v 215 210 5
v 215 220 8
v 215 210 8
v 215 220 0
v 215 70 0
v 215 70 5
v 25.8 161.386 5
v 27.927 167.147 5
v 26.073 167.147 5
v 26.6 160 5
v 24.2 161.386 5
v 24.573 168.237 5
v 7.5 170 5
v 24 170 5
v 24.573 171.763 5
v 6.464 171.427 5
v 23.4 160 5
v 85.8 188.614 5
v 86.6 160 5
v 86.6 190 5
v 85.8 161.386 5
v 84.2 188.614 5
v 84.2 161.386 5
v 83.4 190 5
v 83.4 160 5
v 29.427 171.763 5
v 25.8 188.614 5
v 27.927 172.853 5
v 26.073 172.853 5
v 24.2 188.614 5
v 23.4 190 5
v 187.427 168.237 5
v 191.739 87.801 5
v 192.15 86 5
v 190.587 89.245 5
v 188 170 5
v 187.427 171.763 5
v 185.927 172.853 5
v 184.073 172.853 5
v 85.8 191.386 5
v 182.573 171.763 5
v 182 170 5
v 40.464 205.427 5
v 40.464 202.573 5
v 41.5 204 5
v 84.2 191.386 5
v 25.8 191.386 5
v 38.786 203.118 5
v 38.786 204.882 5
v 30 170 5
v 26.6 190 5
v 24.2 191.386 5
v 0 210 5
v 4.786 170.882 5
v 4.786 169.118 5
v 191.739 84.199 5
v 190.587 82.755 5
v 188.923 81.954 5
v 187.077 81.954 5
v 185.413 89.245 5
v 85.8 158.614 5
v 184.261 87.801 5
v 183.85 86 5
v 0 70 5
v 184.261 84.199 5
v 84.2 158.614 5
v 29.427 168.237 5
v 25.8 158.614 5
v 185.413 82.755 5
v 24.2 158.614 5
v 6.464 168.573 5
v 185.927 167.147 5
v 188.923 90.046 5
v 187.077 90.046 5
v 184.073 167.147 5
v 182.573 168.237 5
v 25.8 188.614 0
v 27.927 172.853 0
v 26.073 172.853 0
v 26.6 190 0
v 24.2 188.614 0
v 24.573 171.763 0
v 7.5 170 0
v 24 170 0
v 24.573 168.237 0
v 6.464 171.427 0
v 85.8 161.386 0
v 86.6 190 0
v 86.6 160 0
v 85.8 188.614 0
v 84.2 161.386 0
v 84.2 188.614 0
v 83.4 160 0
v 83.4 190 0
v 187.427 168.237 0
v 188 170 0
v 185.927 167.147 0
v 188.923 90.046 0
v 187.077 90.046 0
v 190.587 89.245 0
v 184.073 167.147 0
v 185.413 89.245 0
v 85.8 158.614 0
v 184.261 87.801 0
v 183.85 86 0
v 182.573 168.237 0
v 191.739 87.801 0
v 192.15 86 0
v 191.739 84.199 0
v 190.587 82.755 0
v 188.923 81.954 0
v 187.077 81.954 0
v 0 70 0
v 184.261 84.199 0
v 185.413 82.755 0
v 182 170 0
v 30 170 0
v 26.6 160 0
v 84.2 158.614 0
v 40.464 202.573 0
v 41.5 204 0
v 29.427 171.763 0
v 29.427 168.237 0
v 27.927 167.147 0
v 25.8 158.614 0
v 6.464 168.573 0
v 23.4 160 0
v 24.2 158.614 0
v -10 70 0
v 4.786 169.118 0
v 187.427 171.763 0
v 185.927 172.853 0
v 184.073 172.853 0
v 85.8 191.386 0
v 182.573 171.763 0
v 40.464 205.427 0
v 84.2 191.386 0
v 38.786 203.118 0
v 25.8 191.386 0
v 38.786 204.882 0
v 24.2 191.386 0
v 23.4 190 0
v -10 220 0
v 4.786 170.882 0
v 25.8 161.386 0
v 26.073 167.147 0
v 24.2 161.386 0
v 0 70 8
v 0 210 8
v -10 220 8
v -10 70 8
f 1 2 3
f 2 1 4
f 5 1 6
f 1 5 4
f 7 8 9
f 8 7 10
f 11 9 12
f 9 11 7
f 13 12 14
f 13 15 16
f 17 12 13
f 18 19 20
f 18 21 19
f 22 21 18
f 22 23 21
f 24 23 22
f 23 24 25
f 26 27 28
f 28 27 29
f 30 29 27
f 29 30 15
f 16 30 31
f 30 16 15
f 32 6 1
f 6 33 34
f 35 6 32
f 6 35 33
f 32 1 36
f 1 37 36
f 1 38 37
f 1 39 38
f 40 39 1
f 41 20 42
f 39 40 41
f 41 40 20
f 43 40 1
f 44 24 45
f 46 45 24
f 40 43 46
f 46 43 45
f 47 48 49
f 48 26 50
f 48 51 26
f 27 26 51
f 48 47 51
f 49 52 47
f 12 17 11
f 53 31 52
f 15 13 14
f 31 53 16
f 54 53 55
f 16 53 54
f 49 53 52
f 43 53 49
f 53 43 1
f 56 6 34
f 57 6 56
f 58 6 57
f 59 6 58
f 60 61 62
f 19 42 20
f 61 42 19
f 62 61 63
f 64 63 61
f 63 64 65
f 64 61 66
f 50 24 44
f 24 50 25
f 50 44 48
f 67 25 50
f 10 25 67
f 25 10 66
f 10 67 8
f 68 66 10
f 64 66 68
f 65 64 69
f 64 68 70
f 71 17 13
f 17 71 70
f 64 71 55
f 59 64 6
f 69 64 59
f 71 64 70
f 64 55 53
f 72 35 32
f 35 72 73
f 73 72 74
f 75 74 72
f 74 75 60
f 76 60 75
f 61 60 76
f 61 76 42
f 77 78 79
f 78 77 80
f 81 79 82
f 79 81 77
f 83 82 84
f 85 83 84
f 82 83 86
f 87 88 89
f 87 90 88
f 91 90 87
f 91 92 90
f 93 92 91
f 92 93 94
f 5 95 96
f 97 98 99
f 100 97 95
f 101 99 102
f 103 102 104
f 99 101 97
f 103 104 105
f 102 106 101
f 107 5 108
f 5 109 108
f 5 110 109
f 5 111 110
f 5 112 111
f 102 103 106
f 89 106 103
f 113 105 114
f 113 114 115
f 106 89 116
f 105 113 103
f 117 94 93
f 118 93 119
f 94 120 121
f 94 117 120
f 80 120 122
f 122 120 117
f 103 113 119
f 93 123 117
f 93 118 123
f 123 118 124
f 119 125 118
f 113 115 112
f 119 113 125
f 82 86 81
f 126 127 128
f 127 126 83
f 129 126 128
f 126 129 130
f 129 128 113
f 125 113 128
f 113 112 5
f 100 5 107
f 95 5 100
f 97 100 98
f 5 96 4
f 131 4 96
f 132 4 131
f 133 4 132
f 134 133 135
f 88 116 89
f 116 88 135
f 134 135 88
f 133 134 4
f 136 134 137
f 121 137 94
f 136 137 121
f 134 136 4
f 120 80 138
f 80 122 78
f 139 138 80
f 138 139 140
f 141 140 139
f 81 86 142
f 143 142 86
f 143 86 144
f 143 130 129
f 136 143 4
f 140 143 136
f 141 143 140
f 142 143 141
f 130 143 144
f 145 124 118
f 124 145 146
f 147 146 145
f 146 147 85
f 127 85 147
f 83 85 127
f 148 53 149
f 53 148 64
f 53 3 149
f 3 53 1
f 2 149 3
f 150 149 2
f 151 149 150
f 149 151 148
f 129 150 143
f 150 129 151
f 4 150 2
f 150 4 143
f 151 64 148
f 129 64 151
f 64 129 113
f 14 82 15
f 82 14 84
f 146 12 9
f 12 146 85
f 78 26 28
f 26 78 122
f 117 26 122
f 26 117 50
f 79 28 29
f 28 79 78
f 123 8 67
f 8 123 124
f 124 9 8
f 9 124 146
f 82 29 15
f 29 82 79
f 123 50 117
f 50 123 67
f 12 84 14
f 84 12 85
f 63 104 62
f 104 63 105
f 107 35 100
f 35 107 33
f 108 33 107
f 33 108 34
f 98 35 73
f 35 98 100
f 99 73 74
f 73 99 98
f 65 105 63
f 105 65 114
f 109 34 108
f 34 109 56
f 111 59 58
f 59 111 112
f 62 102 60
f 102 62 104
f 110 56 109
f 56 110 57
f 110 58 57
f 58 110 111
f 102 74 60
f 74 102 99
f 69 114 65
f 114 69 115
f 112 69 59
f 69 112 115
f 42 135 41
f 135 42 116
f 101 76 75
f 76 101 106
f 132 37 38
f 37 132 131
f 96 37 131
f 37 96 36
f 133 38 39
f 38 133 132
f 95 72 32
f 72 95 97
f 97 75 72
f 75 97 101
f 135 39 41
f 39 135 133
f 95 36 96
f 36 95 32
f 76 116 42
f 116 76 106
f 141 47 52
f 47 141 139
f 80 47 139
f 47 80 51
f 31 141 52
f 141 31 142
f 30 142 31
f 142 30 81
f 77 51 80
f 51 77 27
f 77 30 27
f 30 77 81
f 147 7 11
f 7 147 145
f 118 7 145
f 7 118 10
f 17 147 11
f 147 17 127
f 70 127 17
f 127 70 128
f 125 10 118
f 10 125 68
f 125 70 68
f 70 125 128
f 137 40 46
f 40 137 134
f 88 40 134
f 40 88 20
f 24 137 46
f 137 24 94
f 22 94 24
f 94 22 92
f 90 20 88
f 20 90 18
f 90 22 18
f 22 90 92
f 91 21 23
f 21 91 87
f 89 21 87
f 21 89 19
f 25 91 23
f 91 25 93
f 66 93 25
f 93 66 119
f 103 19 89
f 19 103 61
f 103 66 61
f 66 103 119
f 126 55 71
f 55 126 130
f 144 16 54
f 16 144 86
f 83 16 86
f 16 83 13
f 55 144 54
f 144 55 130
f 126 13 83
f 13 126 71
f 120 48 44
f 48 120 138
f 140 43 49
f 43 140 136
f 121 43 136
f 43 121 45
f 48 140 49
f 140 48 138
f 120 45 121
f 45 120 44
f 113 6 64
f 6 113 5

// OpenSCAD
//mounting frames for faces

    //Select, please: uncomment "//"

drilling_jig();
//front();
//back_top();
//back_bottom();
//axis_top(); //for detachable cover, instead x-profile plus cover_mounting()
//cover_top();
//oc_lab(); //lettering OC_Lab
//left_front_cable_channel();
//right_front();
//sides_back();  //2 needed
//bottom_front();
//bottom_back();
//cover_mounting();

x = 215;
y1 = 130; //front
y2 = 120; //back
yb = 246; //bottom
overlap = 12;
y1_o=y1-2*overlap; //y1 for cover
z = 210 - 2 * overlap; //210 mm - 2 x 12 mm
z2=z-20; //-20=y_end and y_motor
h = 17;
d = 5;
r1 = 1.5;
offset=6.5;

module drilling_jig() {
difference() {
    union() {
    cube([215, 210, 5]);
    translate([-10, 70, 0]) cube([10, 150, 8]);
    translate([0, 210, 0]) cube([215, 10, 8]);
    }
    //HDMI plug, center for 23-mm drill
    translate([27, 210-40, 0]) cylinder(h=10, r=3);
    //12-V plug
    translate([215-27, 210-124, 0]) cylinder(h=10, r=4.15); 
    //Adafruit 4218 - USB-C plug, center for 23-mm drill
    translate([185, 210-40, 0]) cylinder(h=5, r=3);
    //USB-Hub mounting with zip ties
    translate([25, 190, 0]) cylinder(h=10, r=1.6);
    translate([25, 190-30, 0]) cylinder(h=10, r=1.6);
    translate([85, 190, 0]) cylinder(h=10, r=1.6);
    translate([85, 190-30, 0]) cylinder(h=10, r=1.6);
    translate([6, 210-40, 0]) cylinder(h=15, r=r1);
    translate([40, 210-6, 0]) cylinder(h=15, r=r1);
    cube([215, 70, 5]);
    }
}
module bottom_front() {
difference() {
    union() {
    x_axis();
    translate([-5, h, 5]) rotate([180, 0, 90]) yb_axis_left();
    translate([x+5, h+yb, 5]) rotate([180, 0, 270]) yb_axis_right();
    translate([x, 2*h+yb, 0]) rotate([180, 180, 0]) x_axis();
    }
translate([-5, 135, -2]) cube([x+10, 180, 20]);
}
}
module bottom_back() {
difference() {
    union() {
    x_axis();
    translate([-5, h, 5]) rotate([180, 0, 90]) yb_axis_left();
    translate([x+5, h+yb, 5]) rotate([180, 0, 270]) yb_axis_right();
    translate([x, 2*h+yb, 0]) rotate([180, 180, 0]) x_axis();
    }
translate([-5, 0, -2]) cube([x+10, 155, 20]);
translate([89, 100, -2]) cube([37, 200, 10]);
}
}
module sides_back() {
difference() {
    union() {
    y2_axis();   
    translate([y2+d, h, 0]) rotate([0, 0, 90]) z_axis();
    translate([-5, z+h, 0]) rotate([0, 0, 270]) z_axis();
    rotate([0, 0, 180]) translate([-y2, -(z+h+17), 0]) y2_axis();
    }
translate([0, 110, 0]) cube([30, 146, 10], center=true);
}
}
module right_front() {
y1_axis();   
translate([y1+d, h, 0]) rotate([0, 0, 90]) z_axis();
translate([-5, z+h, 0]) rotate([0, 0, 270]) z_axis();
rotate([0, 0, 180]) translate([-y1, -(z+h+17), 0]) y1_axis();
}
module left_front_cable_channel() {
y1_axis();   
translate([y1+5, h, 0]) rotate([0, 0, 90]) z_axis();
translate([-5, z+h, 0]) rotate([0, 0, 270]) z_axis_cable_channel();
rotate([0, 0, 180]) translate([-y1, -(z+h+17), 0]) y1_axis_cable_channel();
}
module oc_lab() {
translate([0, 0, 0])
linear_extrude(3) text("OCLab2", size =20, direction = "ltr", spacing =1);
translate([0, -2, 0]) cube([101, 2, 3]);
translate([100.8, 19, 0])
linear_extrude(3) text("GM", size =8, direction = "ltr", spacing =1);
    translate([110, 23, 0])
    difference() {
    cylinder(r=10, h=3);
    cylinder(r=9, h=3);
    }
    translate([94, 18.4, 0]) cube([25, 1, 3]);
}
module cover_top() {
 x_magnet();
    rotate([0,0,-90]) translate([-(y1-overlap),-5,1.5])
 y1_axis_oB();
    rotate([0,0,90]) translate([overlap,-(x+5),1.5])
 y1_axis_oB();
}
//axis_top for detachable cover instead x-profile plus z_axis??
module axis_top() {
difference() {
    union() {
    cube([x-0.5, 20, 20]);
    translate([0, -12, 6]) cube([x-0.5, overlap, 6.5]);
    translate([0, 7.5, 20]) cube([x-0.5, 6.5, overlap]);
    }
    translate([15, -(overlap-3), 0])
    cylinder(h=30, r=1.5);
    translate([x-0.5-15, -(overlap-3), 0])
    cylinder(h=30, r=1.5);
    rotate([90, 0, 0])
    translate([15, 20+overlap-3, -20])
    cylinder(h=30, r=1.5);
    rotate([90, 0, 0])
    translate([x-0.5-15, 20+overlap-3, -20])
    cylinder(h=30, r=1.5);
}
}
module front() {
    difference() {
    union() {
    rotate([180,0,0]) translate([0, -12, -6.5])
    x_axis_front();
    rotate([180,0,90]) translate([overlap, -5, -5]) 
    z2_axis_front();
    rotate([180,0,270]) translate([-(z2+overlap), -(x+5), -5]) z2_axis_front();
    }
    translate([108, 8.5, 4]) cube([140, 8, 10], center=true);
}
}
module back_top() {
difference() {
union() {
rotate([180,0,90]) translate([0, -5, -5]) 
    z_axis_cable_channel_back();
rotate([180,0,270]) translate([-(z+overlap), -(x+5), -5]) z_axis_back();
translate([x,z+h+overlap,0]) rotate([0,0,180]) x_axis();
    }
    //translate([5, 183, -10])
    //cube([10, 15, 20]);
    translate([-10, 0, -10])
    cube([230, 100, 20]);
    }
}
module back_bottom() {
difference() {
union() {
rotate([180,0,90]) translate([0, -5, -5]) 
    z_axis_cable_channel_back();
rotate([180,0,270]) translate([-(z+overlap), -(x+5), -5]) z_axis_back();
translate([x,z+h+overlap,0]) rotate([0,0,180]) x_axis();
    }
    translate([-10, 100, -10])
    cube([230, 120, 20]);
    }
}
module x_axis() {
difference() {
    union() {
    cube([x, h, d]);
    translate([0,5,0])
    cube([x, overlap, offset]);
    }
}
}
module x_axis_front() {
    cube([x, overlap, offset]);
    translate([-5,0,1.5])
    cube([5,12,d]);
    translate([x, 0, 1.5])
    cube([5,12,d]);
}
module x_axis_back() {
difference() {
    union() {
    cube([x, overlap, offset]);
    translate([-5,0,1.5])
    cube([5,12,5]);
    translate([x, 0, 1.5])
    cube([5,12,5]);
    }
}
}
module y1_axis() {
difference() {
    union() {
    cube([y1, h, d]);
    translate([0, 5, -1.5])
    cube([y1, overlap, offset]);
    }
}
}
module y1_axis_oB() {
    union() {
    cube([y1_o, h, d]);
    translate([0,5,-1.5])
    cube([y1_o, overlap, offset]);
    }
}
module y1_axis_cable_channel() {
difference() {
    union() {
    cube([y1, h, d]);
    translate([0,5,-1.5])
    cube([y1, overlap, offset]);
    translate([6, 11, 5])
    cube([y1-12, 6, 7.5]);
    }
}
}
module y2_axis() {
difference() {
    union() {
    cube([y2, h, d]);
    translate([0,5,-1.5])
    cube([y2, overlap, offset]);
    }
}
}
module yb_axis_left() {
difference() {
    union() {
    cube([yb, h, d]);
    translate([0,5,-1.5])
    cube([yb, overlap, offset]);
    }
}
}
module yb_axis_right() {
difference() {
    union() {
    cube([yb, h, d]);
    translate([0,5,-1.5])
    cube([yb, overlap, offset]);
    }
}
}
module z_axis() {
difference() {
    union() {
    cube([z, h, d]);
    translate([0, d, -1.5])
    cube([z, overlap, offset]);
    }
}
}
module z_axis_back() {
difference() {
    union() {
    cube([z+overlap, h, d]);
    translate([0, d, -1.5])
    cube([z+overlap, overlap, offset]);
    }
}
}
module z_axis_front() {
    cube([z, h, d]);
    translate([0, 5, -1.5])
    cube([z, overlap, offset]);
}
module z_axis_cable_channel() {
difference() {
    union() {
    cube([z, h, d]);
    translate([0,5,-1.5])
    cube([z, overlap, offset]);
    translate([6, 11, 5])
    cube([z-12, 6, 7.5]);
    }
}
}
module z_axis_cable_channel_back() {
difference() {
    union() {
    cube([z+overlap, h, d]);
    translate([0,5,-1.5])
    cube([z+overlap, overlap, offset]);
    translate([6, 11, 5])
    cube([z, 6, 7.5]);
    }
}
}
module z2_axis_front() {
    cube([z2, h, d]);
    translate([0, 5, -1.5])
    cube([z2, overlap, offset]);
}
module x_magnet() {
difference() {
    union() {
    cube([x, h-5, 10]);
    translate([0, -5, 1.5]) cube([x, 5, 5]);
    }
    translate([25, 2, 0])
    cube([8.5, 8.5, 3.5]);
    translate([25.2, 2, 5])
    cube([8.1, 10.5, 3.1]);
    translate([x-25-10, 2, 0])
    cube([8.5, 8.5, 3.5]);
    translate([x-24.8-10, 2, 5])
    cube([8.1, 10.5, 3.1]);
}
}
module x_magnet_2() {
difference() {
    union() {
    cube([x, h-5, 10]);
    translate([-5, 0, 2])
    cube([5,12,5]);
    translate([x, 0, 2])
    cube([5,12,5]);
    }
    translate([25, 2, 0])
    cube([8.5, 8.5, 3.5]);
    translate([25.2, 2, 5])
    cube([8.1, 10.5, 3.1]);
    translate([x-25-10, 2, 0])
    cube([8.5, 8.5, 3.5]);
    translate([x-24.8-10, 2, 5])
    cube([8.1, 10.5, 3.1]);
}
}
module cover_mounting() {
    translate([0, -2.5, -5])
x_axis_cover();
translate([x-1, -5, -7.5]) rotate([270, 0, 180])
x_axis_cover();
    translate([35, -5, -17.5])
cube([50, 12.5, 4.5]);
    translate([35, 3, -15])
cube([50, 4.5, 12.5]); 
    translate([135, -5, -17.5])
cube([50, 12.5, 4.5]);
    translate([135, 3, -16])
cube([50, 4.5, 12.5]);
}
module x_axis_cover() {
difference() {
    union() {
    cube([x-1, h, d-0.2]);
    translate([0,5,0])
    cube([x-1, overlap, offset]);
    }
    translate([15, h-3, -2])
    cylinder(h = 10, r=r1);
    translate([x-1-15, h-3, -2])
    cylinder(h = 10, r=r1);
    translate([(x-1)/2, h-8, -2])
    cylinder(h = 10, r=r1);
}
}
